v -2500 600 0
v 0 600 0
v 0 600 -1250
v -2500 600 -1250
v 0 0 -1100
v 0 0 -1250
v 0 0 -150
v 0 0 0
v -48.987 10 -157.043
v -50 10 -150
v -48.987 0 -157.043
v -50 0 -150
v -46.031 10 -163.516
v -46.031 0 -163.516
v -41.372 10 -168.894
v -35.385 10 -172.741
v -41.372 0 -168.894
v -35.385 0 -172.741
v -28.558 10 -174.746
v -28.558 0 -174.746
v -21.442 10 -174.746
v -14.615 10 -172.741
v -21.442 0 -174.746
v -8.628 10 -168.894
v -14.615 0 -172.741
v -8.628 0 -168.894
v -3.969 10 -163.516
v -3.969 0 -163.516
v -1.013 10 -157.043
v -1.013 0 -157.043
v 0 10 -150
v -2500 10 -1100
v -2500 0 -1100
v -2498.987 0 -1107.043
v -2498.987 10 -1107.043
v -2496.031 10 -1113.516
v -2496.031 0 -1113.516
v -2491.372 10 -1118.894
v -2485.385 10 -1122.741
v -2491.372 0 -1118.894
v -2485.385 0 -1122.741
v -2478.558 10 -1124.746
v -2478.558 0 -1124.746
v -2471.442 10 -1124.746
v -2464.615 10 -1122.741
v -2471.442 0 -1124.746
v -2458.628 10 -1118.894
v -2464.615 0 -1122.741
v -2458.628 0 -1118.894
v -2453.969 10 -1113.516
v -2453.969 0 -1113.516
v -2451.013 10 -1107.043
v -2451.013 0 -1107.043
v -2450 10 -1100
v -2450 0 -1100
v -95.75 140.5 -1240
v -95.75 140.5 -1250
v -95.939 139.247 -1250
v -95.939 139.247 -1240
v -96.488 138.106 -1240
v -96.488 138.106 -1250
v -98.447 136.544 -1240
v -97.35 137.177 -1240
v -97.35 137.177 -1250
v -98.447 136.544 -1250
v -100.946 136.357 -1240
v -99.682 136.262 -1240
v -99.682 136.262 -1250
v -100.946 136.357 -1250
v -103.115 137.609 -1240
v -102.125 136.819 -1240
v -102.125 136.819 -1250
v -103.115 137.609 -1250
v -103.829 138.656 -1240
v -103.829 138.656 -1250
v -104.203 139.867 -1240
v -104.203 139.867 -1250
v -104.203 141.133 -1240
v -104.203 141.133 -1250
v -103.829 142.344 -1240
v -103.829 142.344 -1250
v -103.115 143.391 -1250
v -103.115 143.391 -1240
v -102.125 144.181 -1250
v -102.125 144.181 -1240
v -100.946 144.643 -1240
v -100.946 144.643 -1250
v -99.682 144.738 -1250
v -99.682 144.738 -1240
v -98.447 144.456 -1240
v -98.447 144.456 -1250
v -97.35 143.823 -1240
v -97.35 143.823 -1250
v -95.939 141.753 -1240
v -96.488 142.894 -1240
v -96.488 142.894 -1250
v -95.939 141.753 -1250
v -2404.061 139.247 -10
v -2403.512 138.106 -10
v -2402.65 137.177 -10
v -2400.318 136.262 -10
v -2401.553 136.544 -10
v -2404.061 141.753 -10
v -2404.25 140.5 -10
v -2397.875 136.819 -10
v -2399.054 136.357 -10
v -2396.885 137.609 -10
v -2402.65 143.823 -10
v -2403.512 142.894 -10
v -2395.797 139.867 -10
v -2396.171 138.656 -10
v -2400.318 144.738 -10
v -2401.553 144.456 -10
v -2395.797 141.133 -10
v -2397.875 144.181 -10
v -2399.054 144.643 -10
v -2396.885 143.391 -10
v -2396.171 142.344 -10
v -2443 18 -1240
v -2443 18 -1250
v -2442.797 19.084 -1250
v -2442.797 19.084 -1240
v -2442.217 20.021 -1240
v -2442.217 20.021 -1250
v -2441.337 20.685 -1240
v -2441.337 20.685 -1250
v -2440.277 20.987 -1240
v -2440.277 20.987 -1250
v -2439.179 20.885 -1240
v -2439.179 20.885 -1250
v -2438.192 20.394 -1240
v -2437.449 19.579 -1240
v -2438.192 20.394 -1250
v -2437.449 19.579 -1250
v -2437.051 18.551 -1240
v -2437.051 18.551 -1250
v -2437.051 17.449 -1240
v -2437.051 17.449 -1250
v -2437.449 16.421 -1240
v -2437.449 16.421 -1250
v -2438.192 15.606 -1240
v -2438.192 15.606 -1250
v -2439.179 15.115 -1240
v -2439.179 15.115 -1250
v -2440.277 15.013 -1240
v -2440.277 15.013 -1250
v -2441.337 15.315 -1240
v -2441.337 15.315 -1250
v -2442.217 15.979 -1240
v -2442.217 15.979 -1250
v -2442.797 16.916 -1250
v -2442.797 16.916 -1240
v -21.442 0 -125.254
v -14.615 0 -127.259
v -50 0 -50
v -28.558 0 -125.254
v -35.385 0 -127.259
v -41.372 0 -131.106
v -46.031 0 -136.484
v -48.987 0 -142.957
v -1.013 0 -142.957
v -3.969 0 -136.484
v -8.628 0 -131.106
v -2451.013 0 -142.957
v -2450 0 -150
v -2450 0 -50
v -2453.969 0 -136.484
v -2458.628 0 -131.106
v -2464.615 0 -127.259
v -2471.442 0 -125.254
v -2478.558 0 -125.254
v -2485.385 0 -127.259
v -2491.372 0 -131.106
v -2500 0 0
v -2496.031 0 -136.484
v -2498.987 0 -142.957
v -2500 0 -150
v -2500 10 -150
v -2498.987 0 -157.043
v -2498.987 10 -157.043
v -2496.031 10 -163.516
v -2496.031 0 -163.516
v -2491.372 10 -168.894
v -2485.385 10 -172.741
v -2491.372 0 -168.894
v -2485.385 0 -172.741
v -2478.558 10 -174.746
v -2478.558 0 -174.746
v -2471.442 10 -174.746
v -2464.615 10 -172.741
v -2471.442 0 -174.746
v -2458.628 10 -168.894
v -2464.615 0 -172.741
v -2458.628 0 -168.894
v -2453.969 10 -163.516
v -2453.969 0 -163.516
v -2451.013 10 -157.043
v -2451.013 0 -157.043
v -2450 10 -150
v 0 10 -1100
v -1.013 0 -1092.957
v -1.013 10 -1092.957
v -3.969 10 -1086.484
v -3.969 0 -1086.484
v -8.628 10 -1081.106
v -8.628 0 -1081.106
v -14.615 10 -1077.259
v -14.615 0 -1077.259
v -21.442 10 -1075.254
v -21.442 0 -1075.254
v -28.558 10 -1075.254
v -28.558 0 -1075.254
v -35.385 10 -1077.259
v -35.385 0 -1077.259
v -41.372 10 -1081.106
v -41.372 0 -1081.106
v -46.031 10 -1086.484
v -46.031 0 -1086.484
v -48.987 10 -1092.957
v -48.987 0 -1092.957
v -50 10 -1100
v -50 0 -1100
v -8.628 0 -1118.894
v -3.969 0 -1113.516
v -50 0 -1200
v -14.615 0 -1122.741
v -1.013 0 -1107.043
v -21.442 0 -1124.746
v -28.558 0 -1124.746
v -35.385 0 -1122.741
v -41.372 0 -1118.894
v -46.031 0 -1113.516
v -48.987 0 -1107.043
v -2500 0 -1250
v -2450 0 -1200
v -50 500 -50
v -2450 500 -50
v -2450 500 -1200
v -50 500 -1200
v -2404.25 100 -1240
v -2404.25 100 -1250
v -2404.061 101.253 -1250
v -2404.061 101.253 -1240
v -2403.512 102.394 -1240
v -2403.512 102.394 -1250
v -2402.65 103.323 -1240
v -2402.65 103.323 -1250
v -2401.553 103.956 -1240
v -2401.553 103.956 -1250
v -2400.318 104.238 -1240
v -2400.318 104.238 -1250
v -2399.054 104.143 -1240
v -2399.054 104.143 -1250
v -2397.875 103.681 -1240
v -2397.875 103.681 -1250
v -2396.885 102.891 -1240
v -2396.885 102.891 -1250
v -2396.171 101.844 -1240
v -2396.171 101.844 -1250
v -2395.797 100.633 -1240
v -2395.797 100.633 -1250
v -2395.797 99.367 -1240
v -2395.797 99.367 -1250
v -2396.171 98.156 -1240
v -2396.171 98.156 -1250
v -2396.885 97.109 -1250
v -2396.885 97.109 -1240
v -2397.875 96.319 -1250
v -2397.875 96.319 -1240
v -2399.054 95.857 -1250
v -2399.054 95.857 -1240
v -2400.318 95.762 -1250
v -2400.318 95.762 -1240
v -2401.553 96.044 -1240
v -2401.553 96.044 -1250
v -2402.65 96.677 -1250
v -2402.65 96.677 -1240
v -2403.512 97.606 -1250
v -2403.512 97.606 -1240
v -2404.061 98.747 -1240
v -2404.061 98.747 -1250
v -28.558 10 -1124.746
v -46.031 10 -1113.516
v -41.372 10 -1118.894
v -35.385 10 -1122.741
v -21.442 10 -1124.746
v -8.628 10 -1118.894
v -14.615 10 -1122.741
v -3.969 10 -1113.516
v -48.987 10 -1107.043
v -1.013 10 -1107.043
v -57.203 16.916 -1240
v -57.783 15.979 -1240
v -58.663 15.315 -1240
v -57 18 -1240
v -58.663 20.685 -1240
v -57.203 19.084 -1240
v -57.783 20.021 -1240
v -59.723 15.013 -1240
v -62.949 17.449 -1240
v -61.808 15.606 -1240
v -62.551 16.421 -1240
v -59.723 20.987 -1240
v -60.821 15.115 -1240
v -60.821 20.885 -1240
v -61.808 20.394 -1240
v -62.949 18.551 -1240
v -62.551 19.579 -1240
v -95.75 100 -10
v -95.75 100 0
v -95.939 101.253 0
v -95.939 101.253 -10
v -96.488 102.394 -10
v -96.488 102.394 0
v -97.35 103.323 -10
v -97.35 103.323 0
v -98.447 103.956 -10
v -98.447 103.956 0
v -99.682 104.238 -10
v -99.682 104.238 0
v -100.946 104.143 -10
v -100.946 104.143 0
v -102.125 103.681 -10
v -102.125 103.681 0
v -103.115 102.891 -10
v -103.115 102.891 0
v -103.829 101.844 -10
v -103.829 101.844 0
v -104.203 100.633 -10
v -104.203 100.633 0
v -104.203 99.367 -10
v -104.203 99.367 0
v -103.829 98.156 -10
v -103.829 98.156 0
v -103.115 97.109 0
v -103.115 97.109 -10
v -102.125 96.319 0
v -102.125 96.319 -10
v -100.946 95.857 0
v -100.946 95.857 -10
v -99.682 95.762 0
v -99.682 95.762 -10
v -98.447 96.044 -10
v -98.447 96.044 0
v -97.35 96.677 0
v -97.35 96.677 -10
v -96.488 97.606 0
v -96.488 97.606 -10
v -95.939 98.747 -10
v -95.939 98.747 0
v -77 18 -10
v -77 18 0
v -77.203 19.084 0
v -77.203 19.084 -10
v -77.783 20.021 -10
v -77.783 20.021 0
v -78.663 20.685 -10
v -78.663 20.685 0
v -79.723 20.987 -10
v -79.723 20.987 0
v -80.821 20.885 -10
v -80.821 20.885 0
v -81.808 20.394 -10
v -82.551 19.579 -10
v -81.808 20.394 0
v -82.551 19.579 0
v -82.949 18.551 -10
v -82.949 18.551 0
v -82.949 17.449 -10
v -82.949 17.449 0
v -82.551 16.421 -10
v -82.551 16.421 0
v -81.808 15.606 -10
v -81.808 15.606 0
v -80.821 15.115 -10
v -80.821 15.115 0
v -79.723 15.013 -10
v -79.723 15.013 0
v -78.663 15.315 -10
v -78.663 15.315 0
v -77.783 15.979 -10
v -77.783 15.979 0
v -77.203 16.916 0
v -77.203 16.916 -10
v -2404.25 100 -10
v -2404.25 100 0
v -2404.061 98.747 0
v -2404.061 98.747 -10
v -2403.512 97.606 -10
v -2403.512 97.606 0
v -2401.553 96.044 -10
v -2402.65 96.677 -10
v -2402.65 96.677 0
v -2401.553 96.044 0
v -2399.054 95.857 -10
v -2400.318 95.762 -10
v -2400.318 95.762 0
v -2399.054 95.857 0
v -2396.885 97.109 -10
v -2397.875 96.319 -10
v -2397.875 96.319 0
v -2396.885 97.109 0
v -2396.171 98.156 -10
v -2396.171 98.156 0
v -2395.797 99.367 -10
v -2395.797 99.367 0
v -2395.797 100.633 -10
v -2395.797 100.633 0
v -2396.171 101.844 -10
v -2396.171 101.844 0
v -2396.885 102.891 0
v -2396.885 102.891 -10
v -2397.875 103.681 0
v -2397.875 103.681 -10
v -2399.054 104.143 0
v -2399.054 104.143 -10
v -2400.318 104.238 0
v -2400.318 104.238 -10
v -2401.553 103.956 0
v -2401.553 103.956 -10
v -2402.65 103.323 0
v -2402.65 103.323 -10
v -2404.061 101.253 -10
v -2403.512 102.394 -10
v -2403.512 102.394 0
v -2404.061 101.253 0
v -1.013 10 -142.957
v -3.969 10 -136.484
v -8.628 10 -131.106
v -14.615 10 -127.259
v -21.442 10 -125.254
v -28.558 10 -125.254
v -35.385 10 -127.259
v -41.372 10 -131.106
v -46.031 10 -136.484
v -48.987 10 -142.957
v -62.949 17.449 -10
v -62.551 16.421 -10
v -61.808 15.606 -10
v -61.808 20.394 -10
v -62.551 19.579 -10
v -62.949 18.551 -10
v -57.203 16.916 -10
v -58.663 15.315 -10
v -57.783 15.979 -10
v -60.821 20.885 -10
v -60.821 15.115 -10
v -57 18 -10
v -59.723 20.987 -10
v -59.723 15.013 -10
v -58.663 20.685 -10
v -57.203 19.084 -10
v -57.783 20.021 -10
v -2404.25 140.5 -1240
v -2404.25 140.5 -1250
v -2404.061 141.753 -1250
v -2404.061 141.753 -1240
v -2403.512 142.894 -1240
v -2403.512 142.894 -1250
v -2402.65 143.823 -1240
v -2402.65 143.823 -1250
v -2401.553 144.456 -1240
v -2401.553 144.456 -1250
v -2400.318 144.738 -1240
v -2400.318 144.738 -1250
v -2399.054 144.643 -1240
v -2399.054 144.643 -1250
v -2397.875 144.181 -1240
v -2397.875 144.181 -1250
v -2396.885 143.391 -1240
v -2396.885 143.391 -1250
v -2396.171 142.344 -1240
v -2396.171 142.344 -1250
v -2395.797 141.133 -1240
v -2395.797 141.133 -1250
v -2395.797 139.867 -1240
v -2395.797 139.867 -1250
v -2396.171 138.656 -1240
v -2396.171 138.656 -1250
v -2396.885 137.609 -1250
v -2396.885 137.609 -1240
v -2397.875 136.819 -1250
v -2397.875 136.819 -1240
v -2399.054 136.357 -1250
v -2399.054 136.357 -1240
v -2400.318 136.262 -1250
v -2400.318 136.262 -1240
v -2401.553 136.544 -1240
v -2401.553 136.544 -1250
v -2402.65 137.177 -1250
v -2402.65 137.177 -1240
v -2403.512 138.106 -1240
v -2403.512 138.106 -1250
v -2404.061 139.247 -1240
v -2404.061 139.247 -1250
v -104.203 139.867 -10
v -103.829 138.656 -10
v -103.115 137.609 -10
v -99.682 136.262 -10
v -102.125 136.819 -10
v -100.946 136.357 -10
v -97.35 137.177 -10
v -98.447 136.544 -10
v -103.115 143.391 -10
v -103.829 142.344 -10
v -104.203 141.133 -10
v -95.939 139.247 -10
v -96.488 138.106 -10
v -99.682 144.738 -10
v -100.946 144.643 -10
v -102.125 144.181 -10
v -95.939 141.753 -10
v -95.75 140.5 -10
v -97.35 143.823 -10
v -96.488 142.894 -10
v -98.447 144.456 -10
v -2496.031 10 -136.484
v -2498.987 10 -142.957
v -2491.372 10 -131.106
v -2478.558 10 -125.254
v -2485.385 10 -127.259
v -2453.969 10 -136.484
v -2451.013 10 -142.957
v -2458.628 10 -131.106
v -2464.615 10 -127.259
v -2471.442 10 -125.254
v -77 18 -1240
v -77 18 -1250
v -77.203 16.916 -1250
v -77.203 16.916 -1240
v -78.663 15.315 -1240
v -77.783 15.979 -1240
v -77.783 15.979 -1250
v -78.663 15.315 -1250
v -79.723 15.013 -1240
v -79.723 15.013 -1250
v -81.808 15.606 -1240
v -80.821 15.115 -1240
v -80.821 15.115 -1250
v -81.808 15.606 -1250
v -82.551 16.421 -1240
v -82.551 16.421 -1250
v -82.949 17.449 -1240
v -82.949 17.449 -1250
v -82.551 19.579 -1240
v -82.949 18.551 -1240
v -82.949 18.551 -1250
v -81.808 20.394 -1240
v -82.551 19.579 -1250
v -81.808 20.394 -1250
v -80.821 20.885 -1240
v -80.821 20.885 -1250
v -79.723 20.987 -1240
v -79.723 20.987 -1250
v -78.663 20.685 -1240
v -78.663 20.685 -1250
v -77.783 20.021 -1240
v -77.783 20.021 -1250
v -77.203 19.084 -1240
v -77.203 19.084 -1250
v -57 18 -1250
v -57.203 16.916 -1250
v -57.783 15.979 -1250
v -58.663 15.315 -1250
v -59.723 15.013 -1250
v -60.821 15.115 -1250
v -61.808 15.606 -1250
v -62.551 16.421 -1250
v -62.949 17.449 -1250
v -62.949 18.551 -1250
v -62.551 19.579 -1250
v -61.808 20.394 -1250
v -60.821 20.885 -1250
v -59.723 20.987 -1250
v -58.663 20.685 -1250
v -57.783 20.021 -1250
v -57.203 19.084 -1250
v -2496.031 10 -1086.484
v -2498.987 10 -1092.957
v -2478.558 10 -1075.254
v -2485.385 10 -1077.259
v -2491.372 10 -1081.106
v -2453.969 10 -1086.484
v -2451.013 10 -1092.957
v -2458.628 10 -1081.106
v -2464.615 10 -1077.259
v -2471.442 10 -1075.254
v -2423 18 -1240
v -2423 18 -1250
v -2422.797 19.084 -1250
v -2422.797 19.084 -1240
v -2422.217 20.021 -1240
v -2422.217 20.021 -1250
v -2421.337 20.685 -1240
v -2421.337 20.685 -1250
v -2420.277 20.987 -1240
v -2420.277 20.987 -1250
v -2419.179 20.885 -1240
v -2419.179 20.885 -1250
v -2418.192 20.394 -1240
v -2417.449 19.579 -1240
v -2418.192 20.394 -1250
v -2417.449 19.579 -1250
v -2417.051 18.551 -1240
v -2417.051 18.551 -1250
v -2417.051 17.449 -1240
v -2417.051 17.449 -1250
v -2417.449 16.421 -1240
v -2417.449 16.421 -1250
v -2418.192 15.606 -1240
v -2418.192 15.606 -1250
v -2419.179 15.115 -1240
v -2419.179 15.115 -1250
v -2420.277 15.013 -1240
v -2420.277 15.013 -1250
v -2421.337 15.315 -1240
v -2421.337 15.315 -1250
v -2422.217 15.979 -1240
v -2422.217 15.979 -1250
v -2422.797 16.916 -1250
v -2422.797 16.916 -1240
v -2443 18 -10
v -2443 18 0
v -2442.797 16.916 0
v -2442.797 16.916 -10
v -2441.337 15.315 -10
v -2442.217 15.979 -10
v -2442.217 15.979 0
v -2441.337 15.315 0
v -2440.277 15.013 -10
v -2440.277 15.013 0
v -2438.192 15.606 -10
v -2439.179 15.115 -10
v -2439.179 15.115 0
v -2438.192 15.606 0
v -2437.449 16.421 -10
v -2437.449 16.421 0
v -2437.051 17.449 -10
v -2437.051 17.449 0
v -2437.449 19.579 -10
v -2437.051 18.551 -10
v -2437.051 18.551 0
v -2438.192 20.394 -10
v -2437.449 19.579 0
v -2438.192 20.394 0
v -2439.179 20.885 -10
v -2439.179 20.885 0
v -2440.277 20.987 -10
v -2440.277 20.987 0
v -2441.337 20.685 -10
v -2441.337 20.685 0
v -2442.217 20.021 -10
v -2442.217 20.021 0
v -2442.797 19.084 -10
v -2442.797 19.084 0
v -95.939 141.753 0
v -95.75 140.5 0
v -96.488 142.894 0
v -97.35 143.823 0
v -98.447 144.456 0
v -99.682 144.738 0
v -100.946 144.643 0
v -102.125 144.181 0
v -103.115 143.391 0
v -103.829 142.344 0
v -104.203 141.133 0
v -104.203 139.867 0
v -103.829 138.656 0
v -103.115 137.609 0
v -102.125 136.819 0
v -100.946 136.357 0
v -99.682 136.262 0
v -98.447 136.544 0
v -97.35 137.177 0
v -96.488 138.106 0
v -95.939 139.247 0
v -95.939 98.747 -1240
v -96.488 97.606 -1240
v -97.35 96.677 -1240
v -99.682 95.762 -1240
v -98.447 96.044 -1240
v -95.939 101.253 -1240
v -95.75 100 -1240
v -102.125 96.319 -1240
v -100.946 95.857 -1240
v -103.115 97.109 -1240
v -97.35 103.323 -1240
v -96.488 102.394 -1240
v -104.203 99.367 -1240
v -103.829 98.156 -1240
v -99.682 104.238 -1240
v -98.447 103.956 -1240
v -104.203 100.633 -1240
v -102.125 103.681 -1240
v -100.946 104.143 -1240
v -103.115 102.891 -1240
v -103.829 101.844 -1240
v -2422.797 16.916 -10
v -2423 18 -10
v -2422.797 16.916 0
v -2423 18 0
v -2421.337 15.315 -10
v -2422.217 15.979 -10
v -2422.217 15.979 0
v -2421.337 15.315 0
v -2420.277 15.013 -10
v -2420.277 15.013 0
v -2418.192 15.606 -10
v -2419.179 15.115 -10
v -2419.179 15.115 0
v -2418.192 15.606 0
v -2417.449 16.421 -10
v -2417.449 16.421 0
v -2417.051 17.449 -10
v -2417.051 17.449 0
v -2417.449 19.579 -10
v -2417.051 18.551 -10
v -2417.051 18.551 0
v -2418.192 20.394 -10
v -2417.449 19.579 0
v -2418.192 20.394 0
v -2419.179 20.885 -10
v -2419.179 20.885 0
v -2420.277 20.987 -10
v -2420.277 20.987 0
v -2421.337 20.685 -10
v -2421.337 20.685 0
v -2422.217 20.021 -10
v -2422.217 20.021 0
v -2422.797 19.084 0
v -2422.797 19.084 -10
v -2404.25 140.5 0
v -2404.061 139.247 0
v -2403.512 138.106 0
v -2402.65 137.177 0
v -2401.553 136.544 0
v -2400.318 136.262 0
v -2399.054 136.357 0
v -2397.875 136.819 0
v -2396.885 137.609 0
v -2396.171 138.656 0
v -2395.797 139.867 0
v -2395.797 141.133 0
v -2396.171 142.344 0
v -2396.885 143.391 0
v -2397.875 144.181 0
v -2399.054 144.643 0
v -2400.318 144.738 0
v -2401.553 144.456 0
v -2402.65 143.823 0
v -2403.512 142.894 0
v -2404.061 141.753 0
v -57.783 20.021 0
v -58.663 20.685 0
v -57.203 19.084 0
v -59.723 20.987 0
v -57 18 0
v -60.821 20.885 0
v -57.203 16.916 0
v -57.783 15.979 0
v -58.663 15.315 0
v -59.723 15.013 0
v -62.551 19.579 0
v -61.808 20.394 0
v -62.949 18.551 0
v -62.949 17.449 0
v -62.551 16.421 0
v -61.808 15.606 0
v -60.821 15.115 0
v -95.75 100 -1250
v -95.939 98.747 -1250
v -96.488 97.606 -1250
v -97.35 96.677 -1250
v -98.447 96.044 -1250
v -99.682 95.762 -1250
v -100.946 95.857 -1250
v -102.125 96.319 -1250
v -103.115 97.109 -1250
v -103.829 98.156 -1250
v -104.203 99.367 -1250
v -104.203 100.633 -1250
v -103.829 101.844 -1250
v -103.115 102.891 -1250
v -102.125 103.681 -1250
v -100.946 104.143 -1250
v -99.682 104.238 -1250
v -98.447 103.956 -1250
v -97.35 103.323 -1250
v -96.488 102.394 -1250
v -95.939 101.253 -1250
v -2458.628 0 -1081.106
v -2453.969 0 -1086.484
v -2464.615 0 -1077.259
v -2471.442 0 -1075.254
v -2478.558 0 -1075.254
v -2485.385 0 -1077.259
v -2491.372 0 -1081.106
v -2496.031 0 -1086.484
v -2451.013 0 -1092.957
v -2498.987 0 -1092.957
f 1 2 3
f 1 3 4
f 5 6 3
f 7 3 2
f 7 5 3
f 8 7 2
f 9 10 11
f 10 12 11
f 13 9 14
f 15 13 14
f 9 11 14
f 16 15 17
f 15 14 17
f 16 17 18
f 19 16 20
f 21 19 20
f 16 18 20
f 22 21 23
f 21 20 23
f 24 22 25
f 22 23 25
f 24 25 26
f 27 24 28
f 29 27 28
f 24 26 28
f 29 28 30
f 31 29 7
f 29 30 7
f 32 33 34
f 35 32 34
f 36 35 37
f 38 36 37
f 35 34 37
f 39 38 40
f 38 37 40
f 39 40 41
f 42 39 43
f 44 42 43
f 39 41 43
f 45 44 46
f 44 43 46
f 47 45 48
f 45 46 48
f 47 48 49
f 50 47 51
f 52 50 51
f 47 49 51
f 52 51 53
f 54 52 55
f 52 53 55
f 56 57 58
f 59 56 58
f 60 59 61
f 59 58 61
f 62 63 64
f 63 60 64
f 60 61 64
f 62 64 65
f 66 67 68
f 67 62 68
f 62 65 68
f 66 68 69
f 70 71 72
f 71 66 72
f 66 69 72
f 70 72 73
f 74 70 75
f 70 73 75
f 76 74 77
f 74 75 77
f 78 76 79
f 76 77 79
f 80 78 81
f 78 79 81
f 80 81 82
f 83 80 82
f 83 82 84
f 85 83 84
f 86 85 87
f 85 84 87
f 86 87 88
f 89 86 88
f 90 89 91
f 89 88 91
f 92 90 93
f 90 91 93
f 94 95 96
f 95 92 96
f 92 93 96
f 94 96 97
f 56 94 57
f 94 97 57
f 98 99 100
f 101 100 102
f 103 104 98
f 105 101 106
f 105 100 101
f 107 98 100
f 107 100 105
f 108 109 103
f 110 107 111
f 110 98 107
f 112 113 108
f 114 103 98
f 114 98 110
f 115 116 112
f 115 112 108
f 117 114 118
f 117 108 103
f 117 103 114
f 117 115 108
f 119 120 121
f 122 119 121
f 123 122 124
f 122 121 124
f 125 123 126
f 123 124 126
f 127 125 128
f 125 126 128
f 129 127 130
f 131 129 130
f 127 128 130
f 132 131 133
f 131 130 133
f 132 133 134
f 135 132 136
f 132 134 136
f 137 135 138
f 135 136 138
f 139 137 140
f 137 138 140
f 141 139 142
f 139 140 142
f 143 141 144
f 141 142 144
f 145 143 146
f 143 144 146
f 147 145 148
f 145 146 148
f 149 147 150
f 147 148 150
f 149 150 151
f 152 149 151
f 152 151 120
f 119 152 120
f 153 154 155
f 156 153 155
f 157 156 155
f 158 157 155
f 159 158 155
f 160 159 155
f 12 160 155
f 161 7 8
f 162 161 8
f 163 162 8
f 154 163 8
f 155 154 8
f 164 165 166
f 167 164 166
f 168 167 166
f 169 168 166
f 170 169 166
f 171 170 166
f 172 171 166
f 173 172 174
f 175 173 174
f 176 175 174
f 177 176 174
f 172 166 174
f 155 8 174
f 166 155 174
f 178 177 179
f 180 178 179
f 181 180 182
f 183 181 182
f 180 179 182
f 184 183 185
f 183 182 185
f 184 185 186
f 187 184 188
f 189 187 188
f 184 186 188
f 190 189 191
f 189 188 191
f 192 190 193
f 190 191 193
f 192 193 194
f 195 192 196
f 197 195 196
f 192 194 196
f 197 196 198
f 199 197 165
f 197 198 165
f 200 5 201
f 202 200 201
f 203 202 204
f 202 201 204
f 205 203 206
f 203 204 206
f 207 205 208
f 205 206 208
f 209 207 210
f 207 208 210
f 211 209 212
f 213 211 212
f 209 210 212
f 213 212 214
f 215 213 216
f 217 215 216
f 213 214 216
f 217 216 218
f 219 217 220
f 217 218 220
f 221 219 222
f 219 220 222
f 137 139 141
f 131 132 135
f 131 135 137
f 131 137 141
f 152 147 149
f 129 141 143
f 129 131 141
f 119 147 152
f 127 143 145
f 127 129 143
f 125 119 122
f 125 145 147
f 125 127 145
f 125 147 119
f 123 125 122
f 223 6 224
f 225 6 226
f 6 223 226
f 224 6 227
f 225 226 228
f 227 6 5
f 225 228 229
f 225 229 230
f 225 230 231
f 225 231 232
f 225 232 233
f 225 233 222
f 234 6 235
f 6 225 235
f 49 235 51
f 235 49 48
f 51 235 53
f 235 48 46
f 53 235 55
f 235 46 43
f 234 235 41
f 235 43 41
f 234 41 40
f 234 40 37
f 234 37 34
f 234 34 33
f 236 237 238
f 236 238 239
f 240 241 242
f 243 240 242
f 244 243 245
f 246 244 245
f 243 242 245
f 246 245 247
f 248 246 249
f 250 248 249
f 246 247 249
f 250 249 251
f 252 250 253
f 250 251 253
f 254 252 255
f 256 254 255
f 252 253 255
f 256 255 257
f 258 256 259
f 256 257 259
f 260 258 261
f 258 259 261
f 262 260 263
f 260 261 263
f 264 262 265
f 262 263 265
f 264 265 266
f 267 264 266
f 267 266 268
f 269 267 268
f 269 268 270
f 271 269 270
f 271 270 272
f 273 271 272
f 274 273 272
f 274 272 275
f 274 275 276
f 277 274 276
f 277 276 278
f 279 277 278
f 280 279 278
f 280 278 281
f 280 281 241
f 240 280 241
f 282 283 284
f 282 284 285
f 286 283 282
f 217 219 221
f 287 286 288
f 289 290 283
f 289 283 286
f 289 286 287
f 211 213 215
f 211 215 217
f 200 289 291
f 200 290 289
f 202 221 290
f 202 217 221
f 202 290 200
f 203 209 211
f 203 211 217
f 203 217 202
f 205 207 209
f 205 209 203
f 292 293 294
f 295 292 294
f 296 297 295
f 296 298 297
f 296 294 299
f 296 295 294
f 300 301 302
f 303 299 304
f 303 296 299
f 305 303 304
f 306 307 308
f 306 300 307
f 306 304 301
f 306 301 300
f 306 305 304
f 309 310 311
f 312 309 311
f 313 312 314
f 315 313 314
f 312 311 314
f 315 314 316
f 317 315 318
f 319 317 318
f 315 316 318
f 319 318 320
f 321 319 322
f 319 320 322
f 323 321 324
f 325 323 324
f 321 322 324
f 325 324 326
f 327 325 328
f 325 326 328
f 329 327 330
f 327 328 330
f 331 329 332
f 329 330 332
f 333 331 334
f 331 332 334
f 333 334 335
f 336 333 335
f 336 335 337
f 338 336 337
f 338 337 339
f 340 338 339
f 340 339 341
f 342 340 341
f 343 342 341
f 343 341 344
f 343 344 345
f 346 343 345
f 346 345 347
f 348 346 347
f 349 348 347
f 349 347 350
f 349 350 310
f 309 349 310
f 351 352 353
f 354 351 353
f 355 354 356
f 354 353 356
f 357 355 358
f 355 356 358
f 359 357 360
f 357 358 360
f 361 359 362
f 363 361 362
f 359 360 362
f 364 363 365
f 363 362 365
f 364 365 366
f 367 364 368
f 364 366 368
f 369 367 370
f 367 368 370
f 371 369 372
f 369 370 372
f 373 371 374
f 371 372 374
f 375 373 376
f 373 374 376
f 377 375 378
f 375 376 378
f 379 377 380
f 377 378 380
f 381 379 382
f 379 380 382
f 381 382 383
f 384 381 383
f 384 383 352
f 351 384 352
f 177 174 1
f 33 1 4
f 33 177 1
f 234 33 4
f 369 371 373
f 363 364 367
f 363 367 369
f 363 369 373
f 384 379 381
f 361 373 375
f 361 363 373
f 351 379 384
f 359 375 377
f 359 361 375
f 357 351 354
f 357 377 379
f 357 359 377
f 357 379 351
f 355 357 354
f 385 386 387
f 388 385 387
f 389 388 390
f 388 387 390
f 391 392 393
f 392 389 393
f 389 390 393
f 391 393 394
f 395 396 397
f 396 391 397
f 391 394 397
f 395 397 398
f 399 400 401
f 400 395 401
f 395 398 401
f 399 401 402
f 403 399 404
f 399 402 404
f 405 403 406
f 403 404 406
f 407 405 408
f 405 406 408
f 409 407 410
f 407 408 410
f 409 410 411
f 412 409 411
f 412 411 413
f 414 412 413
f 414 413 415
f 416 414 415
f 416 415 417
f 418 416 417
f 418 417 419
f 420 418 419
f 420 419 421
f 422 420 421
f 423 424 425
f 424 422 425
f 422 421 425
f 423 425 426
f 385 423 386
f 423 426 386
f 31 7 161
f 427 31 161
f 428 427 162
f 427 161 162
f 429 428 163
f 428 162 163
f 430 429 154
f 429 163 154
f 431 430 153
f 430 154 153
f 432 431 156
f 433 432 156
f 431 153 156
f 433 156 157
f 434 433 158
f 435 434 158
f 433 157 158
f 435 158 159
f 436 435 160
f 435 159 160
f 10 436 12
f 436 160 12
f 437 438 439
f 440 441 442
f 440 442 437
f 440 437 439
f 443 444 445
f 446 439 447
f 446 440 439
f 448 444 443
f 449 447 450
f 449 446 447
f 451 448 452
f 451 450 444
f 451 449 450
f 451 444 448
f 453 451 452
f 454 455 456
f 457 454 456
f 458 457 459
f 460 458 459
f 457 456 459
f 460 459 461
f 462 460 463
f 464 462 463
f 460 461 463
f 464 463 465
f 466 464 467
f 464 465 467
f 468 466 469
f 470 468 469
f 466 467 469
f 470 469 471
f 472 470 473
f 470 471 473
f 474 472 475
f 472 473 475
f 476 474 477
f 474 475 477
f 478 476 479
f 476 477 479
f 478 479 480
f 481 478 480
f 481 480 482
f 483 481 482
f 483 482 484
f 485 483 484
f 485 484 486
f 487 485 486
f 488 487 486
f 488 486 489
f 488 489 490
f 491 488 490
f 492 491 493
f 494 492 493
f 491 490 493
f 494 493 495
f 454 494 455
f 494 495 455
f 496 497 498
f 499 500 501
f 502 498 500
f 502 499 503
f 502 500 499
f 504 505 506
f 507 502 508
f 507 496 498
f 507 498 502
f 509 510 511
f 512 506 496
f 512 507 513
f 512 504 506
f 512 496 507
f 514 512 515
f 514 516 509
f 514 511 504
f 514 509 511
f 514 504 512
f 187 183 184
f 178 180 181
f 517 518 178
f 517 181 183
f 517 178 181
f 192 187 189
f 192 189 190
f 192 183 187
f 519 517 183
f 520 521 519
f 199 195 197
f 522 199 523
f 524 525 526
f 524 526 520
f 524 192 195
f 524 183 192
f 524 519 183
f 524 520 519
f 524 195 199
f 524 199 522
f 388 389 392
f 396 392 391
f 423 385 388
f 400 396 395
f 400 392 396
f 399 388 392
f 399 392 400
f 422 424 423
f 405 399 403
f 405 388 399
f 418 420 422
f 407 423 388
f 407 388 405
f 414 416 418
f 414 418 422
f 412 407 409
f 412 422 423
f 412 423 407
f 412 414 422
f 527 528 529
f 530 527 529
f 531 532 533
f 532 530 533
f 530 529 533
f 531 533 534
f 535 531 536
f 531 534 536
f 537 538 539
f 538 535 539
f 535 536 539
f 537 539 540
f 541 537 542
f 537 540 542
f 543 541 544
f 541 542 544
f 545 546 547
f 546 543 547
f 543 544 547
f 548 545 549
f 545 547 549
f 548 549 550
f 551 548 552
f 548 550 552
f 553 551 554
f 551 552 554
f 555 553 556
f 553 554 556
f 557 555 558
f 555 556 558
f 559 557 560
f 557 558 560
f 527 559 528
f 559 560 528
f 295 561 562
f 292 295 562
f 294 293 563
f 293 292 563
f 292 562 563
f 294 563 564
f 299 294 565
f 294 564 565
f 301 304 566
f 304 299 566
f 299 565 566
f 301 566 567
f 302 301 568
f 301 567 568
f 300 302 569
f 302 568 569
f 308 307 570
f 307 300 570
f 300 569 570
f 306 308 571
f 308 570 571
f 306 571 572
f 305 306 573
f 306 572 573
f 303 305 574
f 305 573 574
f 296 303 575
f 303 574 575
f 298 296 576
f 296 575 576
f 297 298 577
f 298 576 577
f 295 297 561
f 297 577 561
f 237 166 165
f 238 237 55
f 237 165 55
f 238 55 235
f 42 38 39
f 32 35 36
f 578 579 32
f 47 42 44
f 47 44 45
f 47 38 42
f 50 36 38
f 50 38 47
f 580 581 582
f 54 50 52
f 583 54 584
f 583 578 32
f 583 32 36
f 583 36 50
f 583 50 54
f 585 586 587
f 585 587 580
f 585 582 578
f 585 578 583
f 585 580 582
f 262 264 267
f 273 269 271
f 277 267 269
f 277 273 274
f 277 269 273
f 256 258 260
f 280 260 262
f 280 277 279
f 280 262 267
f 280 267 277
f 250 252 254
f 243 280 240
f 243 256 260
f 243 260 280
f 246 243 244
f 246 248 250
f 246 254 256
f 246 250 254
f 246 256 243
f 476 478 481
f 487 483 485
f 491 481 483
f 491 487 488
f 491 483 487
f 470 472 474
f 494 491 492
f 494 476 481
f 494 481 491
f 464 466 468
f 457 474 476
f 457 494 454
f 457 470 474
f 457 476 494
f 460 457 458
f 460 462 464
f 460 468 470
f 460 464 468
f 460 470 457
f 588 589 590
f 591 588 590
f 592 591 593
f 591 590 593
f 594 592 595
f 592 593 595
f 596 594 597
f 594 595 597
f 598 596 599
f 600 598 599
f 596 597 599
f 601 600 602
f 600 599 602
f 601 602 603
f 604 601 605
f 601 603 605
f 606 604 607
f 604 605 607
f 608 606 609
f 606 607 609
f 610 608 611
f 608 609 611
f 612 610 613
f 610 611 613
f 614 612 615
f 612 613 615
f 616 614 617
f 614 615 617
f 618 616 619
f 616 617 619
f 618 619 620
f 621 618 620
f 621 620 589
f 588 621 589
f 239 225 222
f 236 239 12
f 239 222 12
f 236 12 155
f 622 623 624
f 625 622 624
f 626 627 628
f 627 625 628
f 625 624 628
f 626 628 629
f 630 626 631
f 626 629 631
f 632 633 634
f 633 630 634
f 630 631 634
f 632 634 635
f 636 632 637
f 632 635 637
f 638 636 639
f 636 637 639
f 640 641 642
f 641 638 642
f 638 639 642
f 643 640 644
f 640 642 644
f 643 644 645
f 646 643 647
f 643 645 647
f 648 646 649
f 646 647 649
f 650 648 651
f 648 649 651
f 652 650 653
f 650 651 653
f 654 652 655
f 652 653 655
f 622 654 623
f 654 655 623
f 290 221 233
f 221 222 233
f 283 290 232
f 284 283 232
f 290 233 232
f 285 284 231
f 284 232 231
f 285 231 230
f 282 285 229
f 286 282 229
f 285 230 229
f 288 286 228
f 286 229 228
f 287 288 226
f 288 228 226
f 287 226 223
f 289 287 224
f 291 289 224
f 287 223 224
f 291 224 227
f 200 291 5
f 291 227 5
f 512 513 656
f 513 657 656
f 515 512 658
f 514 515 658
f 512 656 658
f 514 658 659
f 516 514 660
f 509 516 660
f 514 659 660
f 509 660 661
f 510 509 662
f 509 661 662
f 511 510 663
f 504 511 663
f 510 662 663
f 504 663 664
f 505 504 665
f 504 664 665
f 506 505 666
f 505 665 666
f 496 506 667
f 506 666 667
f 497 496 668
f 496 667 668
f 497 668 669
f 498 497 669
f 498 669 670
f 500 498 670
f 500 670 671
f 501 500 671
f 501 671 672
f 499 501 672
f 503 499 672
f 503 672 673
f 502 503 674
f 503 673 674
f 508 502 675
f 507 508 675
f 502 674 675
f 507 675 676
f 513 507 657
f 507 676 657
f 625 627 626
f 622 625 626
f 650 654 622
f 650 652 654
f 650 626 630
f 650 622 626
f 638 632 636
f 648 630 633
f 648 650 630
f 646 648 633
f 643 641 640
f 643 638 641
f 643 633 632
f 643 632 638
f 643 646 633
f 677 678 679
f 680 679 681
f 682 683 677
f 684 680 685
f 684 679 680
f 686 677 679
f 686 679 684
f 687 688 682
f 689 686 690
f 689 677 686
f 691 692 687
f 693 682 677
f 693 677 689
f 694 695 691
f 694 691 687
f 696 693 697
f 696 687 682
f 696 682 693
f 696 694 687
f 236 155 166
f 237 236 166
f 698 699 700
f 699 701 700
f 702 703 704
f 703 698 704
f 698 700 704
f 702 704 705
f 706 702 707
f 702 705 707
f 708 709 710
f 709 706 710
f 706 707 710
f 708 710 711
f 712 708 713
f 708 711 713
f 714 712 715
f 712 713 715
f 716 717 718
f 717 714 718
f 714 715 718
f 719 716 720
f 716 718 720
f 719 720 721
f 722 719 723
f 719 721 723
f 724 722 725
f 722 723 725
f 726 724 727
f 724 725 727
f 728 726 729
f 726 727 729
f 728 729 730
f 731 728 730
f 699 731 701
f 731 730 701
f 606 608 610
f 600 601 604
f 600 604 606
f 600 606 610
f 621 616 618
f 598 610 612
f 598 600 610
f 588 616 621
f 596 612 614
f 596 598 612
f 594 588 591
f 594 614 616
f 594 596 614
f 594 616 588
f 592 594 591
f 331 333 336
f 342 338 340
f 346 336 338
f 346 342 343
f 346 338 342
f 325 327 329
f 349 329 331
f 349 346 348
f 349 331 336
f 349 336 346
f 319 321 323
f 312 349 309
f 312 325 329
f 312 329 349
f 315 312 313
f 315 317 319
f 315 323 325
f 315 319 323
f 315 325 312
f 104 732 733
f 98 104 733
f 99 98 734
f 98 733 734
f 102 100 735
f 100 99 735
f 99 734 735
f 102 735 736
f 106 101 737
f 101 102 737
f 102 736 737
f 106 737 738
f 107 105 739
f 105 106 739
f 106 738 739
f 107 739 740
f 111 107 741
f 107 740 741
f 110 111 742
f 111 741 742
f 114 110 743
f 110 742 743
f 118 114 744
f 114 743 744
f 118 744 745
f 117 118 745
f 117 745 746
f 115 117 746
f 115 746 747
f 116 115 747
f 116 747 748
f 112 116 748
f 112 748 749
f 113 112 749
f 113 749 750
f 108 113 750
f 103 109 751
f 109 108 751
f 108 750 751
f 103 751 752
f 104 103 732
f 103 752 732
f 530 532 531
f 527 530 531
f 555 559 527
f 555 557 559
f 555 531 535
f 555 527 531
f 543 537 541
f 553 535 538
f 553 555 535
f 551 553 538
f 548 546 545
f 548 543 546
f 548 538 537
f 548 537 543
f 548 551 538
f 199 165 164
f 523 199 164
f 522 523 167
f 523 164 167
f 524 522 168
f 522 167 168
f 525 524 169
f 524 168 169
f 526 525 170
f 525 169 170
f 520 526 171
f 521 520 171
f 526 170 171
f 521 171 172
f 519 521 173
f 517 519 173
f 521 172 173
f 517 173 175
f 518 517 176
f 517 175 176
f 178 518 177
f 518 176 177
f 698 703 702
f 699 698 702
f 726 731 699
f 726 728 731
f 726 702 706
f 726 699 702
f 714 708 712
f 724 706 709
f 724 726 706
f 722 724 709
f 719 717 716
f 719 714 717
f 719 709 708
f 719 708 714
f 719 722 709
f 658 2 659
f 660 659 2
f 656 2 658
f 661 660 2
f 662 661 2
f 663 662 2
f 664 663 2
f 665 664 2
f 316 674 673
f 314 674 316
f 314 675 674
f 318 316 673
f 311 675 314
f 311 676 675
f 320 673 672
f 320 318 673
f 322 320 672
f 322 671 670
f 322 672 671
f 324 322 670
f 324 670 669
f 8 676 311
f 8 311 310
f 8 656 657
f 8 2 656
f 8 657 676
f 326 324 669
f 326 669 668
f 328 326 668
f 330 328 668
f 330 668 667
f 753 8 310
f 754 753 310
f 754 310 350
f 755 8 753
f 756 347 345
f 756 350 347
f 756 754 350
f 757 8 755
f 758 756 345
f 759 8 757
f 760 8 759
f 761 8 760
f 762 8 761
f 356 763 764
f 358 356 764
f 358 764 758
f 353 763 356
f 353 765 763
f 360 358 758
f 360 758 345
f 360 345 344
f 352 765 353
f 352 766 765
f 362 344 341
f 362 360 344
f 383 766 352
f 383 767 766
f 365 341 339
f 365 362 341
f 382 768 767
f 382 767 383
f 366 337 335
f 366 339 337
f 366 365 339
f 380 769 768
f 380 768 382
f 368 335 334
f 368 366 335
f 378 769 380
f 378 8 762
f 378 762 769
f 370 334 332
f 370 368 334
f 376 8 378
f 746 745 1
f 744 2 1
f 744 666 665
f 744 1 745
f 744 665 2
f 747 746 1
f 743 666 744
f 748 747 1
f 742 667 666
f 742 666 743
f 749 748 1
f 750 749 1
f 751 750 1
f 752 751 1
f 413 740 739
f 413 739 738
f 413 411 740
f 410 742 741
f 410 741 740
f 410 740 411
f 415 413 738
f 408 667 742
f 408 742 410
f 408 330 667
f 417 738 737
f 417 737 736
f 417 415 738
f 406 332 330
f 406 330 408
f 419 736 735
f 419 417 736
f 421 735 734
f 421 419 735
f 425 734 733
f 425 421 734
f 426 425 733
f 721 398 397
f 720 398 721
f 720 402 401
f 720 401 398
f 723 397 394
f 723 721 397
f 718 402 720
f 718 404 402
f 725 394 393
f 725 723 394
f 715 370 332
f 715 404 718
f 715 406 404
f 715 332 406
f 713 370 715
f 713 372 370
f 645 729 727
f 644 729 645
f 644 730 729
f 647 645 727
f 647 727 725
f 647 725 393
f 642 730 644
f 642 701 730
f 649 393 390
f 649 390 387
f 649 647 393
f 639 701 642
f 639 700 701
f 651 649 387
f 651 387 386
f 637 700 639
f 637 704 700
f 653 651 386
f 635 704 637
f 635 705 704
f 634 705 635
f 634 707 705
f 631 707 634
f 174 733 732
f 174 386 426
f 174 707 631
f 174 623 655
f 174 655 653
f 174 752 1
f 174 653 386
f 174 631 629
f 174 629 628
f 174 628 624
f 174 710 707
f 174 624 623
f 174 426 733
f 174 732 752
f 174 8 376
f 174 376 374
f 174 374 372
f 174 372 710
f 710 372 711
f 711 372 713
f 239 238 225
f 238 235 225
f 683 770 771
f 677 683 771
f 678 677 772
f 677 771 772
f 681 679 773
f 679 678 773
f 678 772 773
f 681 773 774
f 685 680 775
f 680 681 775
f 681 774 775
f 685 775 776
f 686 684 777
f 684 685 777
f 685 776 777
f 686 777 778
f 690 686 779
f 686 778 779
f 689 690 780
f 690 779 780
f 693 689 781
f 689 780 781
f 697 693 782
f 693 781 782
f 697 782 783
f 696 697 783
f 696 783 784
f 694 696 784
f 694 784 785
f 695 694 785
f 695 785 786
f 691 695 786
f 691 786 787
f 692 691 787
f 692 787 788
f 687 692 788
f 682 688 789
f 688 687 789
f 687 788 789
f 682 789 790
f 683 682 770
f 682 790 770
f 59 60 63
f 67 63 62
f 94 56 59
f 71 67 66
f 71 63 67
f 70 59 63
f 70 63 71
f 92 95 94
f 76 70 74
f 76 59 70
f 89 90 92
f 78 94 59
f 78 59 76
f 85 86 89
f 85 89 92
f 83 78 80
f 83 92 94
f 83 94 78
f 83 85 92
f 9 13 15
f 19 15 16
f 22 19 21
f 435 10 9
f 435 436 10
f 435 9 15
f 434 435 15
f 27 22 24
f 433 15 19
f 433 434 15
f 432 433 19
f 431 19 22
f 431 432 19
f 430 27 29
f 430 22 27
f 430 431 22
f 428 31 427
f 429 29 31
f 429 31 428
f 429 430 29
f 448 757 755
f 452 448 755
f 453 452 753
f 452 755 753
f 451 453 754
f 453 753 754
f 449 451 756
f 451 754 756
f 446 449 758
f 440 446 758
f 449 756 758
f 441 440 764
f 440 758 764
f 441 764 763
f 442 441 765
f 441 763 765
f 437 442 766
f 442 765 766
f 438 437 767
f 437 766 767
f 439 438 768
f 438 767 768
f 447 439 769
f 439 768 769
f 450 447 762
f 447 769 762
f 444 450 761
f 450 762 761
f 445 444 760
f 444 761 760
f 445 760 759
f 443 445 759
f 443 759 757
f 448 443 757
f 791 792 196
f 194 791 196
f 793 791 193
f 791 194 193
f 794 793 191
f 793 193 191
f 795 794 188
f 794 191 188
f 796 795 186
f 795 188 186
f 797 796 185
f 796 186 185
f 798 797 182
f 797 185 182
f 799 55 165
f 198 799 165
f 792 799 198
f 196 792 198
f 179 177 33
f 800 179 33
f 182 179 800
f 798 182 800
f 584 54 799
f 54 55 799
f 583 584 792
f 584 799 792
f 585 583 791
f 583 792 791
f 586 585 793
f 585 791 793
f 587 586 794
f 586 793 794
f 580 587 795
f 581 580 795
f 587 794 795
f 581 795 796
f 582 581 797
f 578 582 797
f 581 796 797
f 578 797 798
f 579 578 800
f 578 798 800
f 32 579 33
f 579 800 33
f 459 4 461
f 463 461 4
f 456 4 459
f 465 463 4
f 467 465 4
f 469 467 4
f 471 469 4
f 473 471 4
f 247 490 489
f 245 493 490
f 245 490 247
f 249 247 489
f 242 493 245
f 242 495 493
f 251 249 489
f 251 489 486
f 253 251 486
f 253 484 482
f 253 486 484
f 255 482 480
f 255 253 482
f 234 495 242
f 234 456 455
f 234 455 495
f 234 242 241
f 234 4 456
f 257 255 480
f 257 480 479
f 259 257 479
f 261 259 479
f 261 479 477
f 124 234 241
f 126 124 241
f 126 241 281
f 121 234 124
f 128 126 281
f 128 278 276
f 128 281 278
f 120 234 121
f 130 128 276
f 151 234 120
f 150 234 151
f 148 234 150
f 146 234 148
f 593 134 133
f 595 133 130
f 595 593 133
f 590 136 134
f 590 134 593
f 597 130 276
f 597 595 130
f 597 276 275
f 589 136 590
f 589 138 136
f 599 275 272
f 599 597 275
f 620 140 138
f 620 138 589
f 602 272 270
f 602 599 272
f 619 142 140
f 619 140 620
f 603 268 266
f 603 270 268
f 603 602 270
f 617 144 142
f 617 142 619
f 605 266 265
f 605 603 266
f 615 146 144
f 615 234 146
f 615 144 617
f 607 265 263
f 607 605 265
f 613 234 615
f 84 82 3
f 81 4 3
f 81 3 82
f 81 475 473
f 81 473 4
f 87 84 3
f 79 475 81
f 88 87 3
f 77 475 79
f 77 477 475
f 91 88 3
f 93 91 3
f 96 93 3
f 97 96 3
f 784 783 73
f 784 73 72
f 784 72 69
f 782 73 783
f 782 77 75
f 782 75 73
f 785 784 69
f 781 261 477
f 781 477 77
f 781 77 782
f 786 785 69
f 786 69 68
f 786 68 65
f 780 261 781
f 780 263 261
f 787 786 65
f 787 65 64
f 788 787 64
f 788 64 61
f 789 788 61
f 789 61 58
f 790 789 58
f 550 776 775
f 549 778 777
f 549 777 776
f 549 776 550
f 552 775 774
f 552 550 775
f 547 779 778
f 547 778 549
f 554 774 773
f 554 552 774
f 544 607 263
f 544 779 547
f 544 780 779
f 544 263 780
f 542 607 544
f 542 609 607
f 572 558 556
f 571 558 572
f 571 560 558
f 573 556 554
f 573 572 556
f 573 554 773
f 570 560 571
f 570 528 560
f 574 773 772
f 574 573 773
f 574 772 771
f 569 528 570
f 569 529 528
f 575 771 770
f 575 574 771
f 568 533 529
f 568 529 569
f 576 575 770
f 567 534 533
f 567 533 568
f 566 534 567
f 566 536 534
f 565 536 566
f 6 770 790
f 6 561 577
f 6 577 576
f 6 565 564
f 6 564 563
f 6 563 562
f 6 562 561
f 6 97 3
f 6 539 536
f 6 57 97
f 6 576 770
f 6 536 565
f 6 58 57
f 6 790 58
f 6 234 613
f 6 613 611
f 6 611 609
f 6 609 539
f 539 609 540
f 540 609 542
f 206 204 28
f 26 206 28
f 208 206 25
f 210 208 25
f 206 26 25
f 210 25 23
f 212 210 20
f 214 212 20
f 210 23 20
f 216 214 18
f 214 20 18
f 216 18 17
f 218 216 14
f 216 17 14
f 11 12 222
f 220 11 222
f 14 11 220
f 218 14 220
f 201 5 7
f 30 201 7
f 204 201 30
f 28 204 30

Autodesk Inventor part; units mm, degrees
ref_plane "YZ Plane" through (0, 0, 0) normal (1, 0, 0) x (0, 1, 0)
sketch "Sketch1" plane through (0, 0, 0) normal (0, 1, 0) x (-1, 0, 0)
  line L0 (0, 0) -> (2500, 0)
  line L1 (2500, 0) -> (2500, -1250)
  line L2 (2500, -1250) -> (0, -1250)
  line L3 (0, -1250) -> (0, 0)
  dimension "d0" = 2500
  dimension "d1" = 1250
extrude "Extrusion1" add sketch "Sketch1" along normal blind 600
sketch "Sketch2" plane through (0, 0, 0) normal (0, -1, 0) x (1, 0, 0)
  line L0 (-50, -50) -> (-2450, -50)
  line L1 (-2450, -50) -> (-2450, -1200)
  line L2 (-2450, -1200) -> (-50, -1200)
  line L3 (-50, -1200) -> (-50, -50)
  line L4 (0, 0) -> (-2500, 0) projected
  line L5 (0, -1250) -> (0, 0) projected
  dimension "d4" = 2400
  dimension "d5" = 1150
  dimension "d8" = 50
  dimension "d9" = 50
  dimension "d10" = 2500
  dimension "d11" = 1250
extrude "Extrusion2" cut sketch "Sketch2" against normal blind 500
sketch "Sketch3" plane through (-2500, 0, 0) normal (0, 0, 1) x (1, 0, 0)
  line L0 (2500, 0) -> (0, 0) projected
  line L1 (2500, 0) -> (2500, 600) projected
  line L2 (0, 0) -> (0, 600) projected
  circle A0 centre (2440, 18) radius 3
  circle A1 centre (2420, 18) radius 3
  circle A2 centre (2400, 100) radius 4.25
  circle A3 centre (2400, 140.5) radius 4.25
  dimension "d12" = 6
  dimension "d13" = 18
  dimension "d14" = 60
  dimension "d20" = 6
  dimension "d21" = 18
  dimension "d23" = 20
  dimension "d24" = 8.5
  dimension "d25" = 8.5
  dimension "d26" = 100
  dimension "d27" = 40.5
  dimension "d28" = 100
  dimension "d29" = 100
extrude "Extrusion3" cut sketch "Sketch3" against normal blind 10
ref_plane "Work Plane1" through (-2500, 0, -625) normal (0, 0, 1) x (1, 0, 0)
mirror "Mirror1" about plane through (-2500, 0, -625) normal (0, 0, 1) of "Extrusion3"
ref_plane "Work Plane2" through (-1250, 0, -1250) normal (-1, 0, 0) x (0, 0, 1)
mirror "Mirror2" about plane through (-1250, 0, -1250) normal (-1, 0, 0) of "Extrusion3"
mirror "Mirror3" about plane through (-2500, 0, -625) normal (0, 0, 1) of "Mirror2", "Extrusion3"
sketch "Sketch4" plane through (0, 0, 0) normal (0, -1, 0) x (1, 0, 0)
  circle A0 centre (-25, -150) radius 25
  line L0 (0, 0) -> (-2500, 0) projected
  line L1 (0, -1250) -> (0, 0) projected
  circle A1 centre (-2475, -150) radius 25
  circle A2 centre (-25, -1100) radius 25
  circle A3 centre (-2475, -1100) radius 25
  dimension "d30" = 50
  dimension "d31" = 25
  dimension "d32" = 150
  dimension "d33" = 2500
  dimension "d34" = 1250
  dimension "d37" = 2450
  dimension "d40" = 950
extrude "Extrusion4" cut sketch "Sketch4" against normal blind 10
equation "\"d4\" = d10 - 2 * d9"
equation "\"d5\" = d11 - 2 * d8"
equation "\"d9\" = d8"
equation "\"d13\" = 3 * d12"
equation "\"d21\" = d13"
equation "\"d29\" = d28"
equation "\"d37\" = d33 - 2 * d31"
equation "\"d40\" = d34 - 2 * d32"
properties part number "Base" material "Wood (Birch)"
